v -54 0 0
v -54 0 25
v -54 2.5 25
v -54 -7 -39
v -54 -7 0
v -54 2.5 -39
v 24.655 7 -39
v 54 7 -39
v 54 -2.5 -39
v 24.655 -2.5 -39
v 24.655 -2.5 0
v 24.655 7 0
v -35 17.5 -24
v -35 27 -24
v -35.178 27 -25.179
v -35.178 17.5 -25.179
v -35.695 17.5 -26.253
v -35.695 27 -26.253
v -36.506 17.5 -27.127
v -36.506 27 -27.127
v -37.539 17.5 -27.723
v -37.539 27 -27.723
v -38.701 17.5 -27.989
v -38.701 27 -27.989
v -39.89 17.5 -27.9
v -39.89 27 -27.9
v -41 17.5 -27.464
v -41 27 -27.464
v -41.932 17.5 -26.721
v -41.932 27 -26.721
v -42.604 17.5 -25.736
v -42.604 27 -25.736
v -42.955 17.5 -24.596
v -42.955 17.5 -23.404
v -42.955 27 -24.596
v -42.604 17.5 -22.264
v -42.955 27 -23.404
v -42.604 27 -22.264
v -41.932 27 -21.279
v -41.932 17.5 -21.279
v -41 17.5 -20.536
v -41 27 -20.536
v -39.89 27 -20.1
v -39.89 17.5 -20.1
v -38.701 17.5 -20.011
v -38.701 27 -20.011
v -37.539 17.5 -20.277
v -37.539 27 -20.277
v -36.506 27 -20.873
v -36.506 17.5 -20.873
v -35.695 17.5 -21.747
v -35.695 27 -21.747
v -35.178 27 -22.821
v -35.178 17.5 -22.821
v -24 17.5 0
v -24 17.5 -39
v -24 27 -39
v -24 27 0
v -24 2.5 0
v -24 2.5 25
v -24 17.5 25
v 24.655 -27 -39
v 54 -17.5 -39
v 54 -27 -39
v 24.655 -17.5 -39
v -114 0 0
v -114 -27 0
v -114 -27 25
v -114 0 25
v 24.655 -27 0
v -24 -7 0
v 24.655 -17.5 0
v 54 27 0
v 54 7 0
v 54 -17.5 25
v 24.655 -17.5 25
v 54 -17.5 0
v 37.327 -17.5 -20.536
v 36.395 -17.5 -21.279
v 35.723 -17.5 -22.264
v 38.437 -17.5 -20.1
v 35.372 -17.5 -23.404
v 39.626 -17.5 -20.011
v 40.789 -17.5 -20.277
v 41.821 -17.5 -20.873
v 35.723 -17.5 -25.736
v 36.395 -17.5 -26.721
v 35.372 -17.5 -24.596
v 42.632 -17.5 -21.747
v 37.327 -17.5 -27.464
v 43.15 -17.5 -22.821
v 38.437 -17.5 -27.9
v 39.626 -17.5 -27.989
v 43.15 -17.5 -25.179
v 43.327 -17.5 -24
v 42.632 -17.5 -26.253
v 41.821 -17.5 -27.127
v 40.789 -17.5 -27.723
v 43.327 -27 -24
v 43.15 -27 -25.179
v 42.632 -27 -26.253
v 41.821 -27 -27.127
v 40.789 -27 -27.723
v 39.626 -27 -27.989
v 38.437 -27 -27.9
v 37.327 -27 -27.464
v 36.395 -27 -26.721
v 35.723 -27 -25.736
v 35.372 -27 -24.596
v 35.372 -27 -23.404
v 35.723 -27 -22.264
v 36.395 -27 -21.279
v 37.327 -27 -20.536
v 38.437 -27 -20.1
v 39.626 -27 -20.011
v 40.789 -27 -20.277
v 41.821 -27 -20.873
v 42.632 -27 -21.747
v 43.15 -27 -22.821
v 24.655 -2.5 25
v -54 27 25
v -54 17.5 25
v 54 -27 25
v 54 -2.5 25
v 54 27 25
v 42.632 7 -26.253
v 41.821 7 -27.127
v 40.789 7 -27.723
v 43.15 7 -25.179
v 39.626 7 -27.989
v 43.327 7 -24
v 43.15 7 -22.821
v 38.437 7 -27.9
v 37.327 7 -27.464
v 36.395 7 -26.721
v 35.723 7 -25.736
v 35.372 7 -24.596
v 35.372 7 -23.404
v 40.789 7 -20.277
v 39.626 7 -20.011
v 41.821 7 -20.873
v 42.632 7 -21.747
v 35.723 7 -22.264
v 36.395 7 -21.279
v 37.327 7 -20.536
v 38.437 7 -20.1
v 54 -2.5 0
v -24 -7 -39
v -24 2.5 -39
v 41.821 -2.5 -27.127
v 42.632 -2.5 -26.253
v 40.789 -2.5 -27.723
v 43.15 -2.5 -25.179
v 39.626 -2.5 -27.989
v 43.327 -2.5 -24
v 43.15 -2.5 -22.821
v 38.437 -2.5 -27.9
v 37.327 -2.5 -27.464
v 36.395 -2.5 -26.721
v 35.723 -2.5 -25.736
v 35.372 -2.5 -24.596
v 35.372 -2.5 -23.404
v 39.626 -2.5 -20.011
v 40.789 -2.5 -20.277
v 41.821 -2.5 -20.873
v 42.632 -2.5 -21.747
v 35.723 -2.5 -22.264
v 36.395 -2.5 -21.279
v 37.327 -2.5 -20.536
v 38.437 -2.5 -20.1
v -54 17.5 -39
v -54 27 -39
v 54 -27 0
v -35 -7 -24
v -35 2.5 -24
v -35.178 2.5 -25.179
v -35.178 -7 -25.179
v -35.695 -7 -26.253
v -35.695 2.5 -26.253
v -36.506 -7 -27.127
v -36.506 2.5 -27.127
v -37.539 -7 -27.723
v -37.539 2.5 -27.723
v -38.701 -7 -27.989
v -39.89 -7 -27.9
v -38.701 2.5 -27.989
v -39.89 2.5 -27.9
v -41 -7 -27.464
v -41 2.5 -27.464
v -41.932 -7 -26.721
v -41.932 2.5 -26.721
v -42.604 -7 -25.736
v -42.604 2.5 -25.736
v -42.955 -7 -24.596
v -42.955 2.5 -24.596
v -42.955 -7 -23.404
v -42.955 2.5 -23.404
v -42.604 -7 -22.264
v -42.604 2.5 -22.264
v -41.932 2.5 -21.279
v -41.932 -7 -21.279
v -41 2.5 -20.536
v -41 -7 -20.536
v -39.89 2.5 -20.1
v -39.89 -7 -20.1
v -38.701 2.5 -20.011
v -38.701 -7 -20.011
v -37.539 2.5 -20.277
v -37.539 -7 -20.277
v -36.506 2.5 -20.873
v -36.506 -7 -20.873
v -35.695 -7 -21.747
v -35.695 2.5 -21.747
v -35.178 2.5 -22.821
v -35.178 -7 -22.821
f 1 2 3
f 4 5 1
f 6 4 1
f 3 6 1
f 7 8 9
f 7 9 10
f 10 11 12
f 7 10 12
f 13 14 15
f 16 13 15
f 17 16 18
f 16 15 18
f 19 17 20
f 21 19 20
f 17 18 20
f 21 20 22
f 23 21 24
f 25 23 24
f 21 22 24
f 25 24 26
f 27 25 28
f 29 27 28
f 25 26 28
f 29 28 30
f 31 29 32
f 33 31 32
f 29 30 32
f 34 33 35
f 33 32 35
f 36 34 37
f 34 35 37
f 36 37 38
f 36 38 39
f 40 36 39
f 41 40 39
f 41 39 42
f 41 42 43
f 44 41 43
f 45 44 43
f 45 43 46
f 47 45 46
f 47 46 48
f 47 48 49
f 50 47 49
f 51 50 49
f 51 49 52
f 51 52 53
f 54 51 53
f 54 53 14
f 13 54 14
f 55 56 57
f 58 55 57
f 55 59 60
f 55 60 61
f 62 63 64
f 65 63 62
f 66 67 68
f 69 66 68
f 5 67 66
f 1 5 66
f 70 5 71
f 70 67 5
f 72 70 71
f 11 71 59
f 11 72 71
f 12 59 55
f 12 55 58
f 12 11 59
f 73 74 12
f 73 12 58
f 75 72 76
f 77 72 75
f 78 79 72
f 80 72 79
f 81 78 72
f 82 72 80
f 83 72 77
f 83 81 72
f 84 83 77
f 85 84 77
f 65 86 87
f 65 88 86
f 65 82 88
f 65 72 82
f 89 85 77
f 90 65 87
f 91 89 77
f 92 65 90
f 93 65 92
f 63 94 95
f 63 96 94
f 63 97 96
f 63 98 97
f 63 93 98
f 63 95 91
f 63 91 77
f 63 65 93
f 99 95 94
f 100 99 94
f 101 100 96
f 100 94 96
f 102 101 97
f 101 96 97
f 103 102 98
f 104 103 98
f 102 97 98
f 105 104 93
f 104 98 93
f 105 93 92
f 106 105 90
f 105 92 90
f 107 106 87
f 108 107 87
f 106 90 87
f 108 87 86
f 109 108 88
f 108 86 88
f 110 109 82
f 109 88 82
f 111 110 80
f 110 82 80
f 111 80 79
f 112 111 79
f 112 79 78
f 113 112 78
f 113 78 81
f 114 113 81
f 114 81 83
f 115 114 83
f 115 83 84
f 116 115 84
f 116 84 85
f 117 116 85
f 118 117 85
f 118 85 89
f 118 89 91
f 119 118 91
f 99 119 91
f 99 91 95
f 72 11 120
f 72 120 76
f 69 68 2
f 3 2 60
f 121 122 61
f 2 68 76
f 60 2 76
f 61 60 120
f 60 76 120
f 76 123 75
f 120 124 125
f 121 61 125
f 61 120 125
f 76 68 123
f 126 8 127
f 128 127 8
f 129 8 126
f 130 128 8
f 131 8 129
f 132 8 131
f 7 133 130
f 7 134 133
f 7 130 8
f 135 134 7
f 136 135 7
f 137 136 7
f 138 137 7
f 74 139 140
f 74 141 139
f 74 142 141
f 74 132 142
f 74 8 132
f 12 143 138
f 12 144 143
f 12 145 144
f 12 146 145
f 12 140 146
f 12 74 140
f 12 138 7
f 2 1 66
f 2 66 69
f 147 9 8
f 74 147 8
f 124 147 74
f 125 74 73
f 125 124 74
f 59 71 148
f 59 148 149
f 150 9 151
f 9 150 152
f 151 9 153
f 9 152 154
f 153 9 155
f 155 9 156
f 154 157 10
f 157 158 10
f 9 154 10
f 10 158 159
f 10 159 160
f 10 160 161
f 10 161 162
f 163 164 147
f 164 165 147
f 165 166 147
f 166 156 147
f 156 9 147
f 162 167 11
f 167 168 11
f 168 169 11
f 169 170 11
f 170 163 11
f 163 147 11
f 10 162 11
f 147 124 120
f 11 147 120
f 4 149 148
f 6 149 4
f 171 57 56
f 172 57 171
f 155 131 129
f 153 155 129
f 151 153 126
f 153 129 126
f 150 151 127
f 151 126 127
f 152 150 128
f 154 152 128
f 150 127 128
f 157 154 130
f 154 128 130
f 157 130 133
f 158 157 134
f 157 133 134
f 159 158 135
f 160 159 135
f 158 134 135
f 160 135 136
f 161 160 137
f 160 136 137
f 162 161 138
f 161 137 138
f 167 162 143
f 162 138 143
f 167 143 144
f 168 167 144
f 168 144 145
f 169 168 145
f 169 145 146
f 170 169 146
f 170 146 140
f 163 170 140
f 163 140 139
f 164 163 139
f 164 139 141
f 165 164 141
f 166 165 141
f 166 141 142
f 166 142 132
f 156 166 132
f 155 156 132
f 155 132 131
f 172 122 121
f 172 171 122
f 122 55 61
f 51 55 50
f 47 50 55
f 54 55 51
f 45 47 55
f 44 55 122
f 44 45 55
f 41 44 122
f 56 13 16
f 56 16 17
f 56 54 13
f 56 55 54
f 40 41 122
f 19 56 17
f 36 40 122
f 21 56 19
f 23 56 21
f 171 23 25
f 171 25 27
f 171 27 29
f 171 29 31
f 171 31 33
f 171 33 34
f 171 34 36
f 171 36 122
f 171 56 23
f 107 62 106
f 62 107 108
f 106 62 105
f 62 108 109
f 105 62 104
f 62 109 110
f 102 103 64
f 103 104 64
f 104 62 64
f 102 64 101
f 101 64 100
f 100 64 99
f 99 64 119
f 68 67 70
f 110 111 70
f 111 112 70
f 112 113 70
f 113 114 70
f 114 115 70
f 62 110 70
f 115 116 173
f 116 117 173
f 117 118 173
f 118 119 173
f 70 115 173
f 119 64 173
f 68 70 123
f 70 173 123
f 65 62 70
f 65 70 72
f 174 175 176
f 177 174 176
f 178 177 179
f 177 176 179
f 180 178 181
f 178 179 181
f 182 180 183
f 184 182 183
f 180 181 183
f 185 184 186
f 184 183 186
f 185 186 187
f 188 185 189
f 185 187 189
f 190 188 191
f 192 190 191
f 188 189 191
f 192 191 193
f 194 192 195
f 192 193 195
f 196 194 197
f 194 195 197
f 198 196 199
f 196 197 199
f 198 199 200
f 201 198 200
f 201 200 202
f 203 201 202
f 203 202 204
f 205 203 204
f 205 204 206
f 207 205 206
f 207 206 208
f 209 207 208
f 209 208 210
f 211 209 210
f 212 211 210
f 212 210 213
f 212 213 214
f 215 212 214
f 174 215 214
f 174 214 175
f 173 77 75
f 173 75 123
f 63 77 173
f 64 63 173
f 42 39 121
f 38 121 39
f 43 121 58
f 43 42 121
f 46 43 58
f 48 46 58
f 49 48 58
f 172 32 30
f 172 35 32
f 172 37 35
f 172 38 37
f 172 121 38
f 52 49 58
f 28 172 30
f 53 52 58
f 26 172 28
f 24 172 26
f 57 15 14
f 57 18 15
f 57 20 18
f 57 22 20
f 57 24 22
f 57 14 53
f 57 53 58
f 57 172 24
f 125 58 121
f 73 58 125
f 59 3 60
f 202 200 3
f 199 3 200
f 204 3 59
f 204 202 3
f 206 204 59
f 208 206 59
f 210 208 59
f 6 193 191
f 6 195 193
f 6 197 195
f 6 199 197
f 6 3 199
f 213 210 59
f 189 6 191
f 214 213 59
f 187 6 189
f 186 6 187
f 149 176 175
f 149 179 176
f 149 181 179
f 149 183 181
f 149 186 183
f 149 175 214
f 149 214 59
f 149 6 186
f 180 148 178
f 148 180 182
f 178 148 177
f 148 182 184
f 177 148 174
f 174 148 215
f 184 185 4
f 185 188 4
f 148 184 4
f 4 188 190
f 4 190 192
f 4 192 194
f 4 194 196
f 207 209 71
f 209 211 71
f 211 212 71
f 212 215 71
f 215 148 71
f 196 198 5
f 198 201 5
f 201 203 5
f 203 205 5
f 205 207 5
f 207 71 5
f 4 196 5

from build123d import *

# Parameters (mm, degrees)
BOSS_EXTRUDE1_DEPTH              = 25
SKETCH4_W                        = 29.345301095
SKETCH4_H                        = 9.5
SKETCH4_W_2                      = 30
BOSS_EXTRUDE2_DEPTH              = 39
SKETCH2_R                        = 4
ACTUATOR_SHAFT_PASSTHROUGH_DEPTH = 54.5
SKETCH7_W                        = 25
SKETCH7_H                        = 27
BOSS_EXTRUDE4_DEPTH              = 60


with BuildPart() as part:
    # Sketch1 → Boss-Extrude1 (new body)
    with BuildSketch(Plane.XY):
        Polygon((-54, 27), (54, 27), (54, -2.5), (24.654698905, -2.5), (24.654698905, -17.5), (54, -17.5), (54, -27), (-54, -27), (-54, 2.5), (-24, 2.5), (-24, 17.5), (-54, 17.5), align=None)
    extrude(amount=BOSS_EXTRUDE1_DEPTH)

    # Sketch4 → Boss-Extrude2 (add)
    with BuildSketch(Plane(origin=(0, 0, 0), x_dir=(-1, 0, 0), z_dir=(0, 0, -1))):
        with Locations((-39.327349453, 2.25)):
            Rectangle(SKETCH4_W, SKETCH4_H)
        with Locations((-39.327349453, -22.25)):
            Rectangle(SKETCH4_W, SKETCH4_H)
        with Locations((39, -2.25)):
            Rectangle(SKETCH4_W_2, SKETCH4_H)
        with Locations((39, 22.25)):
            Rectangle(SKETCH4_W_2, SKETCH4_H)
    extrude(amount=BOSS_EXTRUDE2_DEPTH)

    # Sketch2 → Actuator Shaft Passthrough (cut)
    with BuildSketch(Plane(origin=(0, 27, 0), x_dir=(1, 0, 0), z_dir=(0, 1, 0))):
        with Locations((39.327349452, 24)):
            Circle(SKETCH2_R)
        with Locations((-39, 24)):
            Circle(SKETCH2_R)
    extrude(amount=-ACTUATOR_SHAFT_PASSTHROUGH_DEPTH, mode=Mode.SUBTRACT)

    # Sketch7 → Boss-Extrude4 (add)
    with BuildSketch(Plane.ZY.offset(54)):
        with Locations((12.5, -13.5)):
            Rectangle(SKETCH7_W, SKETCH7_H)
    extrude(amount=BOSS_EXTRUDE4_DEPTH)


solid = part.part
